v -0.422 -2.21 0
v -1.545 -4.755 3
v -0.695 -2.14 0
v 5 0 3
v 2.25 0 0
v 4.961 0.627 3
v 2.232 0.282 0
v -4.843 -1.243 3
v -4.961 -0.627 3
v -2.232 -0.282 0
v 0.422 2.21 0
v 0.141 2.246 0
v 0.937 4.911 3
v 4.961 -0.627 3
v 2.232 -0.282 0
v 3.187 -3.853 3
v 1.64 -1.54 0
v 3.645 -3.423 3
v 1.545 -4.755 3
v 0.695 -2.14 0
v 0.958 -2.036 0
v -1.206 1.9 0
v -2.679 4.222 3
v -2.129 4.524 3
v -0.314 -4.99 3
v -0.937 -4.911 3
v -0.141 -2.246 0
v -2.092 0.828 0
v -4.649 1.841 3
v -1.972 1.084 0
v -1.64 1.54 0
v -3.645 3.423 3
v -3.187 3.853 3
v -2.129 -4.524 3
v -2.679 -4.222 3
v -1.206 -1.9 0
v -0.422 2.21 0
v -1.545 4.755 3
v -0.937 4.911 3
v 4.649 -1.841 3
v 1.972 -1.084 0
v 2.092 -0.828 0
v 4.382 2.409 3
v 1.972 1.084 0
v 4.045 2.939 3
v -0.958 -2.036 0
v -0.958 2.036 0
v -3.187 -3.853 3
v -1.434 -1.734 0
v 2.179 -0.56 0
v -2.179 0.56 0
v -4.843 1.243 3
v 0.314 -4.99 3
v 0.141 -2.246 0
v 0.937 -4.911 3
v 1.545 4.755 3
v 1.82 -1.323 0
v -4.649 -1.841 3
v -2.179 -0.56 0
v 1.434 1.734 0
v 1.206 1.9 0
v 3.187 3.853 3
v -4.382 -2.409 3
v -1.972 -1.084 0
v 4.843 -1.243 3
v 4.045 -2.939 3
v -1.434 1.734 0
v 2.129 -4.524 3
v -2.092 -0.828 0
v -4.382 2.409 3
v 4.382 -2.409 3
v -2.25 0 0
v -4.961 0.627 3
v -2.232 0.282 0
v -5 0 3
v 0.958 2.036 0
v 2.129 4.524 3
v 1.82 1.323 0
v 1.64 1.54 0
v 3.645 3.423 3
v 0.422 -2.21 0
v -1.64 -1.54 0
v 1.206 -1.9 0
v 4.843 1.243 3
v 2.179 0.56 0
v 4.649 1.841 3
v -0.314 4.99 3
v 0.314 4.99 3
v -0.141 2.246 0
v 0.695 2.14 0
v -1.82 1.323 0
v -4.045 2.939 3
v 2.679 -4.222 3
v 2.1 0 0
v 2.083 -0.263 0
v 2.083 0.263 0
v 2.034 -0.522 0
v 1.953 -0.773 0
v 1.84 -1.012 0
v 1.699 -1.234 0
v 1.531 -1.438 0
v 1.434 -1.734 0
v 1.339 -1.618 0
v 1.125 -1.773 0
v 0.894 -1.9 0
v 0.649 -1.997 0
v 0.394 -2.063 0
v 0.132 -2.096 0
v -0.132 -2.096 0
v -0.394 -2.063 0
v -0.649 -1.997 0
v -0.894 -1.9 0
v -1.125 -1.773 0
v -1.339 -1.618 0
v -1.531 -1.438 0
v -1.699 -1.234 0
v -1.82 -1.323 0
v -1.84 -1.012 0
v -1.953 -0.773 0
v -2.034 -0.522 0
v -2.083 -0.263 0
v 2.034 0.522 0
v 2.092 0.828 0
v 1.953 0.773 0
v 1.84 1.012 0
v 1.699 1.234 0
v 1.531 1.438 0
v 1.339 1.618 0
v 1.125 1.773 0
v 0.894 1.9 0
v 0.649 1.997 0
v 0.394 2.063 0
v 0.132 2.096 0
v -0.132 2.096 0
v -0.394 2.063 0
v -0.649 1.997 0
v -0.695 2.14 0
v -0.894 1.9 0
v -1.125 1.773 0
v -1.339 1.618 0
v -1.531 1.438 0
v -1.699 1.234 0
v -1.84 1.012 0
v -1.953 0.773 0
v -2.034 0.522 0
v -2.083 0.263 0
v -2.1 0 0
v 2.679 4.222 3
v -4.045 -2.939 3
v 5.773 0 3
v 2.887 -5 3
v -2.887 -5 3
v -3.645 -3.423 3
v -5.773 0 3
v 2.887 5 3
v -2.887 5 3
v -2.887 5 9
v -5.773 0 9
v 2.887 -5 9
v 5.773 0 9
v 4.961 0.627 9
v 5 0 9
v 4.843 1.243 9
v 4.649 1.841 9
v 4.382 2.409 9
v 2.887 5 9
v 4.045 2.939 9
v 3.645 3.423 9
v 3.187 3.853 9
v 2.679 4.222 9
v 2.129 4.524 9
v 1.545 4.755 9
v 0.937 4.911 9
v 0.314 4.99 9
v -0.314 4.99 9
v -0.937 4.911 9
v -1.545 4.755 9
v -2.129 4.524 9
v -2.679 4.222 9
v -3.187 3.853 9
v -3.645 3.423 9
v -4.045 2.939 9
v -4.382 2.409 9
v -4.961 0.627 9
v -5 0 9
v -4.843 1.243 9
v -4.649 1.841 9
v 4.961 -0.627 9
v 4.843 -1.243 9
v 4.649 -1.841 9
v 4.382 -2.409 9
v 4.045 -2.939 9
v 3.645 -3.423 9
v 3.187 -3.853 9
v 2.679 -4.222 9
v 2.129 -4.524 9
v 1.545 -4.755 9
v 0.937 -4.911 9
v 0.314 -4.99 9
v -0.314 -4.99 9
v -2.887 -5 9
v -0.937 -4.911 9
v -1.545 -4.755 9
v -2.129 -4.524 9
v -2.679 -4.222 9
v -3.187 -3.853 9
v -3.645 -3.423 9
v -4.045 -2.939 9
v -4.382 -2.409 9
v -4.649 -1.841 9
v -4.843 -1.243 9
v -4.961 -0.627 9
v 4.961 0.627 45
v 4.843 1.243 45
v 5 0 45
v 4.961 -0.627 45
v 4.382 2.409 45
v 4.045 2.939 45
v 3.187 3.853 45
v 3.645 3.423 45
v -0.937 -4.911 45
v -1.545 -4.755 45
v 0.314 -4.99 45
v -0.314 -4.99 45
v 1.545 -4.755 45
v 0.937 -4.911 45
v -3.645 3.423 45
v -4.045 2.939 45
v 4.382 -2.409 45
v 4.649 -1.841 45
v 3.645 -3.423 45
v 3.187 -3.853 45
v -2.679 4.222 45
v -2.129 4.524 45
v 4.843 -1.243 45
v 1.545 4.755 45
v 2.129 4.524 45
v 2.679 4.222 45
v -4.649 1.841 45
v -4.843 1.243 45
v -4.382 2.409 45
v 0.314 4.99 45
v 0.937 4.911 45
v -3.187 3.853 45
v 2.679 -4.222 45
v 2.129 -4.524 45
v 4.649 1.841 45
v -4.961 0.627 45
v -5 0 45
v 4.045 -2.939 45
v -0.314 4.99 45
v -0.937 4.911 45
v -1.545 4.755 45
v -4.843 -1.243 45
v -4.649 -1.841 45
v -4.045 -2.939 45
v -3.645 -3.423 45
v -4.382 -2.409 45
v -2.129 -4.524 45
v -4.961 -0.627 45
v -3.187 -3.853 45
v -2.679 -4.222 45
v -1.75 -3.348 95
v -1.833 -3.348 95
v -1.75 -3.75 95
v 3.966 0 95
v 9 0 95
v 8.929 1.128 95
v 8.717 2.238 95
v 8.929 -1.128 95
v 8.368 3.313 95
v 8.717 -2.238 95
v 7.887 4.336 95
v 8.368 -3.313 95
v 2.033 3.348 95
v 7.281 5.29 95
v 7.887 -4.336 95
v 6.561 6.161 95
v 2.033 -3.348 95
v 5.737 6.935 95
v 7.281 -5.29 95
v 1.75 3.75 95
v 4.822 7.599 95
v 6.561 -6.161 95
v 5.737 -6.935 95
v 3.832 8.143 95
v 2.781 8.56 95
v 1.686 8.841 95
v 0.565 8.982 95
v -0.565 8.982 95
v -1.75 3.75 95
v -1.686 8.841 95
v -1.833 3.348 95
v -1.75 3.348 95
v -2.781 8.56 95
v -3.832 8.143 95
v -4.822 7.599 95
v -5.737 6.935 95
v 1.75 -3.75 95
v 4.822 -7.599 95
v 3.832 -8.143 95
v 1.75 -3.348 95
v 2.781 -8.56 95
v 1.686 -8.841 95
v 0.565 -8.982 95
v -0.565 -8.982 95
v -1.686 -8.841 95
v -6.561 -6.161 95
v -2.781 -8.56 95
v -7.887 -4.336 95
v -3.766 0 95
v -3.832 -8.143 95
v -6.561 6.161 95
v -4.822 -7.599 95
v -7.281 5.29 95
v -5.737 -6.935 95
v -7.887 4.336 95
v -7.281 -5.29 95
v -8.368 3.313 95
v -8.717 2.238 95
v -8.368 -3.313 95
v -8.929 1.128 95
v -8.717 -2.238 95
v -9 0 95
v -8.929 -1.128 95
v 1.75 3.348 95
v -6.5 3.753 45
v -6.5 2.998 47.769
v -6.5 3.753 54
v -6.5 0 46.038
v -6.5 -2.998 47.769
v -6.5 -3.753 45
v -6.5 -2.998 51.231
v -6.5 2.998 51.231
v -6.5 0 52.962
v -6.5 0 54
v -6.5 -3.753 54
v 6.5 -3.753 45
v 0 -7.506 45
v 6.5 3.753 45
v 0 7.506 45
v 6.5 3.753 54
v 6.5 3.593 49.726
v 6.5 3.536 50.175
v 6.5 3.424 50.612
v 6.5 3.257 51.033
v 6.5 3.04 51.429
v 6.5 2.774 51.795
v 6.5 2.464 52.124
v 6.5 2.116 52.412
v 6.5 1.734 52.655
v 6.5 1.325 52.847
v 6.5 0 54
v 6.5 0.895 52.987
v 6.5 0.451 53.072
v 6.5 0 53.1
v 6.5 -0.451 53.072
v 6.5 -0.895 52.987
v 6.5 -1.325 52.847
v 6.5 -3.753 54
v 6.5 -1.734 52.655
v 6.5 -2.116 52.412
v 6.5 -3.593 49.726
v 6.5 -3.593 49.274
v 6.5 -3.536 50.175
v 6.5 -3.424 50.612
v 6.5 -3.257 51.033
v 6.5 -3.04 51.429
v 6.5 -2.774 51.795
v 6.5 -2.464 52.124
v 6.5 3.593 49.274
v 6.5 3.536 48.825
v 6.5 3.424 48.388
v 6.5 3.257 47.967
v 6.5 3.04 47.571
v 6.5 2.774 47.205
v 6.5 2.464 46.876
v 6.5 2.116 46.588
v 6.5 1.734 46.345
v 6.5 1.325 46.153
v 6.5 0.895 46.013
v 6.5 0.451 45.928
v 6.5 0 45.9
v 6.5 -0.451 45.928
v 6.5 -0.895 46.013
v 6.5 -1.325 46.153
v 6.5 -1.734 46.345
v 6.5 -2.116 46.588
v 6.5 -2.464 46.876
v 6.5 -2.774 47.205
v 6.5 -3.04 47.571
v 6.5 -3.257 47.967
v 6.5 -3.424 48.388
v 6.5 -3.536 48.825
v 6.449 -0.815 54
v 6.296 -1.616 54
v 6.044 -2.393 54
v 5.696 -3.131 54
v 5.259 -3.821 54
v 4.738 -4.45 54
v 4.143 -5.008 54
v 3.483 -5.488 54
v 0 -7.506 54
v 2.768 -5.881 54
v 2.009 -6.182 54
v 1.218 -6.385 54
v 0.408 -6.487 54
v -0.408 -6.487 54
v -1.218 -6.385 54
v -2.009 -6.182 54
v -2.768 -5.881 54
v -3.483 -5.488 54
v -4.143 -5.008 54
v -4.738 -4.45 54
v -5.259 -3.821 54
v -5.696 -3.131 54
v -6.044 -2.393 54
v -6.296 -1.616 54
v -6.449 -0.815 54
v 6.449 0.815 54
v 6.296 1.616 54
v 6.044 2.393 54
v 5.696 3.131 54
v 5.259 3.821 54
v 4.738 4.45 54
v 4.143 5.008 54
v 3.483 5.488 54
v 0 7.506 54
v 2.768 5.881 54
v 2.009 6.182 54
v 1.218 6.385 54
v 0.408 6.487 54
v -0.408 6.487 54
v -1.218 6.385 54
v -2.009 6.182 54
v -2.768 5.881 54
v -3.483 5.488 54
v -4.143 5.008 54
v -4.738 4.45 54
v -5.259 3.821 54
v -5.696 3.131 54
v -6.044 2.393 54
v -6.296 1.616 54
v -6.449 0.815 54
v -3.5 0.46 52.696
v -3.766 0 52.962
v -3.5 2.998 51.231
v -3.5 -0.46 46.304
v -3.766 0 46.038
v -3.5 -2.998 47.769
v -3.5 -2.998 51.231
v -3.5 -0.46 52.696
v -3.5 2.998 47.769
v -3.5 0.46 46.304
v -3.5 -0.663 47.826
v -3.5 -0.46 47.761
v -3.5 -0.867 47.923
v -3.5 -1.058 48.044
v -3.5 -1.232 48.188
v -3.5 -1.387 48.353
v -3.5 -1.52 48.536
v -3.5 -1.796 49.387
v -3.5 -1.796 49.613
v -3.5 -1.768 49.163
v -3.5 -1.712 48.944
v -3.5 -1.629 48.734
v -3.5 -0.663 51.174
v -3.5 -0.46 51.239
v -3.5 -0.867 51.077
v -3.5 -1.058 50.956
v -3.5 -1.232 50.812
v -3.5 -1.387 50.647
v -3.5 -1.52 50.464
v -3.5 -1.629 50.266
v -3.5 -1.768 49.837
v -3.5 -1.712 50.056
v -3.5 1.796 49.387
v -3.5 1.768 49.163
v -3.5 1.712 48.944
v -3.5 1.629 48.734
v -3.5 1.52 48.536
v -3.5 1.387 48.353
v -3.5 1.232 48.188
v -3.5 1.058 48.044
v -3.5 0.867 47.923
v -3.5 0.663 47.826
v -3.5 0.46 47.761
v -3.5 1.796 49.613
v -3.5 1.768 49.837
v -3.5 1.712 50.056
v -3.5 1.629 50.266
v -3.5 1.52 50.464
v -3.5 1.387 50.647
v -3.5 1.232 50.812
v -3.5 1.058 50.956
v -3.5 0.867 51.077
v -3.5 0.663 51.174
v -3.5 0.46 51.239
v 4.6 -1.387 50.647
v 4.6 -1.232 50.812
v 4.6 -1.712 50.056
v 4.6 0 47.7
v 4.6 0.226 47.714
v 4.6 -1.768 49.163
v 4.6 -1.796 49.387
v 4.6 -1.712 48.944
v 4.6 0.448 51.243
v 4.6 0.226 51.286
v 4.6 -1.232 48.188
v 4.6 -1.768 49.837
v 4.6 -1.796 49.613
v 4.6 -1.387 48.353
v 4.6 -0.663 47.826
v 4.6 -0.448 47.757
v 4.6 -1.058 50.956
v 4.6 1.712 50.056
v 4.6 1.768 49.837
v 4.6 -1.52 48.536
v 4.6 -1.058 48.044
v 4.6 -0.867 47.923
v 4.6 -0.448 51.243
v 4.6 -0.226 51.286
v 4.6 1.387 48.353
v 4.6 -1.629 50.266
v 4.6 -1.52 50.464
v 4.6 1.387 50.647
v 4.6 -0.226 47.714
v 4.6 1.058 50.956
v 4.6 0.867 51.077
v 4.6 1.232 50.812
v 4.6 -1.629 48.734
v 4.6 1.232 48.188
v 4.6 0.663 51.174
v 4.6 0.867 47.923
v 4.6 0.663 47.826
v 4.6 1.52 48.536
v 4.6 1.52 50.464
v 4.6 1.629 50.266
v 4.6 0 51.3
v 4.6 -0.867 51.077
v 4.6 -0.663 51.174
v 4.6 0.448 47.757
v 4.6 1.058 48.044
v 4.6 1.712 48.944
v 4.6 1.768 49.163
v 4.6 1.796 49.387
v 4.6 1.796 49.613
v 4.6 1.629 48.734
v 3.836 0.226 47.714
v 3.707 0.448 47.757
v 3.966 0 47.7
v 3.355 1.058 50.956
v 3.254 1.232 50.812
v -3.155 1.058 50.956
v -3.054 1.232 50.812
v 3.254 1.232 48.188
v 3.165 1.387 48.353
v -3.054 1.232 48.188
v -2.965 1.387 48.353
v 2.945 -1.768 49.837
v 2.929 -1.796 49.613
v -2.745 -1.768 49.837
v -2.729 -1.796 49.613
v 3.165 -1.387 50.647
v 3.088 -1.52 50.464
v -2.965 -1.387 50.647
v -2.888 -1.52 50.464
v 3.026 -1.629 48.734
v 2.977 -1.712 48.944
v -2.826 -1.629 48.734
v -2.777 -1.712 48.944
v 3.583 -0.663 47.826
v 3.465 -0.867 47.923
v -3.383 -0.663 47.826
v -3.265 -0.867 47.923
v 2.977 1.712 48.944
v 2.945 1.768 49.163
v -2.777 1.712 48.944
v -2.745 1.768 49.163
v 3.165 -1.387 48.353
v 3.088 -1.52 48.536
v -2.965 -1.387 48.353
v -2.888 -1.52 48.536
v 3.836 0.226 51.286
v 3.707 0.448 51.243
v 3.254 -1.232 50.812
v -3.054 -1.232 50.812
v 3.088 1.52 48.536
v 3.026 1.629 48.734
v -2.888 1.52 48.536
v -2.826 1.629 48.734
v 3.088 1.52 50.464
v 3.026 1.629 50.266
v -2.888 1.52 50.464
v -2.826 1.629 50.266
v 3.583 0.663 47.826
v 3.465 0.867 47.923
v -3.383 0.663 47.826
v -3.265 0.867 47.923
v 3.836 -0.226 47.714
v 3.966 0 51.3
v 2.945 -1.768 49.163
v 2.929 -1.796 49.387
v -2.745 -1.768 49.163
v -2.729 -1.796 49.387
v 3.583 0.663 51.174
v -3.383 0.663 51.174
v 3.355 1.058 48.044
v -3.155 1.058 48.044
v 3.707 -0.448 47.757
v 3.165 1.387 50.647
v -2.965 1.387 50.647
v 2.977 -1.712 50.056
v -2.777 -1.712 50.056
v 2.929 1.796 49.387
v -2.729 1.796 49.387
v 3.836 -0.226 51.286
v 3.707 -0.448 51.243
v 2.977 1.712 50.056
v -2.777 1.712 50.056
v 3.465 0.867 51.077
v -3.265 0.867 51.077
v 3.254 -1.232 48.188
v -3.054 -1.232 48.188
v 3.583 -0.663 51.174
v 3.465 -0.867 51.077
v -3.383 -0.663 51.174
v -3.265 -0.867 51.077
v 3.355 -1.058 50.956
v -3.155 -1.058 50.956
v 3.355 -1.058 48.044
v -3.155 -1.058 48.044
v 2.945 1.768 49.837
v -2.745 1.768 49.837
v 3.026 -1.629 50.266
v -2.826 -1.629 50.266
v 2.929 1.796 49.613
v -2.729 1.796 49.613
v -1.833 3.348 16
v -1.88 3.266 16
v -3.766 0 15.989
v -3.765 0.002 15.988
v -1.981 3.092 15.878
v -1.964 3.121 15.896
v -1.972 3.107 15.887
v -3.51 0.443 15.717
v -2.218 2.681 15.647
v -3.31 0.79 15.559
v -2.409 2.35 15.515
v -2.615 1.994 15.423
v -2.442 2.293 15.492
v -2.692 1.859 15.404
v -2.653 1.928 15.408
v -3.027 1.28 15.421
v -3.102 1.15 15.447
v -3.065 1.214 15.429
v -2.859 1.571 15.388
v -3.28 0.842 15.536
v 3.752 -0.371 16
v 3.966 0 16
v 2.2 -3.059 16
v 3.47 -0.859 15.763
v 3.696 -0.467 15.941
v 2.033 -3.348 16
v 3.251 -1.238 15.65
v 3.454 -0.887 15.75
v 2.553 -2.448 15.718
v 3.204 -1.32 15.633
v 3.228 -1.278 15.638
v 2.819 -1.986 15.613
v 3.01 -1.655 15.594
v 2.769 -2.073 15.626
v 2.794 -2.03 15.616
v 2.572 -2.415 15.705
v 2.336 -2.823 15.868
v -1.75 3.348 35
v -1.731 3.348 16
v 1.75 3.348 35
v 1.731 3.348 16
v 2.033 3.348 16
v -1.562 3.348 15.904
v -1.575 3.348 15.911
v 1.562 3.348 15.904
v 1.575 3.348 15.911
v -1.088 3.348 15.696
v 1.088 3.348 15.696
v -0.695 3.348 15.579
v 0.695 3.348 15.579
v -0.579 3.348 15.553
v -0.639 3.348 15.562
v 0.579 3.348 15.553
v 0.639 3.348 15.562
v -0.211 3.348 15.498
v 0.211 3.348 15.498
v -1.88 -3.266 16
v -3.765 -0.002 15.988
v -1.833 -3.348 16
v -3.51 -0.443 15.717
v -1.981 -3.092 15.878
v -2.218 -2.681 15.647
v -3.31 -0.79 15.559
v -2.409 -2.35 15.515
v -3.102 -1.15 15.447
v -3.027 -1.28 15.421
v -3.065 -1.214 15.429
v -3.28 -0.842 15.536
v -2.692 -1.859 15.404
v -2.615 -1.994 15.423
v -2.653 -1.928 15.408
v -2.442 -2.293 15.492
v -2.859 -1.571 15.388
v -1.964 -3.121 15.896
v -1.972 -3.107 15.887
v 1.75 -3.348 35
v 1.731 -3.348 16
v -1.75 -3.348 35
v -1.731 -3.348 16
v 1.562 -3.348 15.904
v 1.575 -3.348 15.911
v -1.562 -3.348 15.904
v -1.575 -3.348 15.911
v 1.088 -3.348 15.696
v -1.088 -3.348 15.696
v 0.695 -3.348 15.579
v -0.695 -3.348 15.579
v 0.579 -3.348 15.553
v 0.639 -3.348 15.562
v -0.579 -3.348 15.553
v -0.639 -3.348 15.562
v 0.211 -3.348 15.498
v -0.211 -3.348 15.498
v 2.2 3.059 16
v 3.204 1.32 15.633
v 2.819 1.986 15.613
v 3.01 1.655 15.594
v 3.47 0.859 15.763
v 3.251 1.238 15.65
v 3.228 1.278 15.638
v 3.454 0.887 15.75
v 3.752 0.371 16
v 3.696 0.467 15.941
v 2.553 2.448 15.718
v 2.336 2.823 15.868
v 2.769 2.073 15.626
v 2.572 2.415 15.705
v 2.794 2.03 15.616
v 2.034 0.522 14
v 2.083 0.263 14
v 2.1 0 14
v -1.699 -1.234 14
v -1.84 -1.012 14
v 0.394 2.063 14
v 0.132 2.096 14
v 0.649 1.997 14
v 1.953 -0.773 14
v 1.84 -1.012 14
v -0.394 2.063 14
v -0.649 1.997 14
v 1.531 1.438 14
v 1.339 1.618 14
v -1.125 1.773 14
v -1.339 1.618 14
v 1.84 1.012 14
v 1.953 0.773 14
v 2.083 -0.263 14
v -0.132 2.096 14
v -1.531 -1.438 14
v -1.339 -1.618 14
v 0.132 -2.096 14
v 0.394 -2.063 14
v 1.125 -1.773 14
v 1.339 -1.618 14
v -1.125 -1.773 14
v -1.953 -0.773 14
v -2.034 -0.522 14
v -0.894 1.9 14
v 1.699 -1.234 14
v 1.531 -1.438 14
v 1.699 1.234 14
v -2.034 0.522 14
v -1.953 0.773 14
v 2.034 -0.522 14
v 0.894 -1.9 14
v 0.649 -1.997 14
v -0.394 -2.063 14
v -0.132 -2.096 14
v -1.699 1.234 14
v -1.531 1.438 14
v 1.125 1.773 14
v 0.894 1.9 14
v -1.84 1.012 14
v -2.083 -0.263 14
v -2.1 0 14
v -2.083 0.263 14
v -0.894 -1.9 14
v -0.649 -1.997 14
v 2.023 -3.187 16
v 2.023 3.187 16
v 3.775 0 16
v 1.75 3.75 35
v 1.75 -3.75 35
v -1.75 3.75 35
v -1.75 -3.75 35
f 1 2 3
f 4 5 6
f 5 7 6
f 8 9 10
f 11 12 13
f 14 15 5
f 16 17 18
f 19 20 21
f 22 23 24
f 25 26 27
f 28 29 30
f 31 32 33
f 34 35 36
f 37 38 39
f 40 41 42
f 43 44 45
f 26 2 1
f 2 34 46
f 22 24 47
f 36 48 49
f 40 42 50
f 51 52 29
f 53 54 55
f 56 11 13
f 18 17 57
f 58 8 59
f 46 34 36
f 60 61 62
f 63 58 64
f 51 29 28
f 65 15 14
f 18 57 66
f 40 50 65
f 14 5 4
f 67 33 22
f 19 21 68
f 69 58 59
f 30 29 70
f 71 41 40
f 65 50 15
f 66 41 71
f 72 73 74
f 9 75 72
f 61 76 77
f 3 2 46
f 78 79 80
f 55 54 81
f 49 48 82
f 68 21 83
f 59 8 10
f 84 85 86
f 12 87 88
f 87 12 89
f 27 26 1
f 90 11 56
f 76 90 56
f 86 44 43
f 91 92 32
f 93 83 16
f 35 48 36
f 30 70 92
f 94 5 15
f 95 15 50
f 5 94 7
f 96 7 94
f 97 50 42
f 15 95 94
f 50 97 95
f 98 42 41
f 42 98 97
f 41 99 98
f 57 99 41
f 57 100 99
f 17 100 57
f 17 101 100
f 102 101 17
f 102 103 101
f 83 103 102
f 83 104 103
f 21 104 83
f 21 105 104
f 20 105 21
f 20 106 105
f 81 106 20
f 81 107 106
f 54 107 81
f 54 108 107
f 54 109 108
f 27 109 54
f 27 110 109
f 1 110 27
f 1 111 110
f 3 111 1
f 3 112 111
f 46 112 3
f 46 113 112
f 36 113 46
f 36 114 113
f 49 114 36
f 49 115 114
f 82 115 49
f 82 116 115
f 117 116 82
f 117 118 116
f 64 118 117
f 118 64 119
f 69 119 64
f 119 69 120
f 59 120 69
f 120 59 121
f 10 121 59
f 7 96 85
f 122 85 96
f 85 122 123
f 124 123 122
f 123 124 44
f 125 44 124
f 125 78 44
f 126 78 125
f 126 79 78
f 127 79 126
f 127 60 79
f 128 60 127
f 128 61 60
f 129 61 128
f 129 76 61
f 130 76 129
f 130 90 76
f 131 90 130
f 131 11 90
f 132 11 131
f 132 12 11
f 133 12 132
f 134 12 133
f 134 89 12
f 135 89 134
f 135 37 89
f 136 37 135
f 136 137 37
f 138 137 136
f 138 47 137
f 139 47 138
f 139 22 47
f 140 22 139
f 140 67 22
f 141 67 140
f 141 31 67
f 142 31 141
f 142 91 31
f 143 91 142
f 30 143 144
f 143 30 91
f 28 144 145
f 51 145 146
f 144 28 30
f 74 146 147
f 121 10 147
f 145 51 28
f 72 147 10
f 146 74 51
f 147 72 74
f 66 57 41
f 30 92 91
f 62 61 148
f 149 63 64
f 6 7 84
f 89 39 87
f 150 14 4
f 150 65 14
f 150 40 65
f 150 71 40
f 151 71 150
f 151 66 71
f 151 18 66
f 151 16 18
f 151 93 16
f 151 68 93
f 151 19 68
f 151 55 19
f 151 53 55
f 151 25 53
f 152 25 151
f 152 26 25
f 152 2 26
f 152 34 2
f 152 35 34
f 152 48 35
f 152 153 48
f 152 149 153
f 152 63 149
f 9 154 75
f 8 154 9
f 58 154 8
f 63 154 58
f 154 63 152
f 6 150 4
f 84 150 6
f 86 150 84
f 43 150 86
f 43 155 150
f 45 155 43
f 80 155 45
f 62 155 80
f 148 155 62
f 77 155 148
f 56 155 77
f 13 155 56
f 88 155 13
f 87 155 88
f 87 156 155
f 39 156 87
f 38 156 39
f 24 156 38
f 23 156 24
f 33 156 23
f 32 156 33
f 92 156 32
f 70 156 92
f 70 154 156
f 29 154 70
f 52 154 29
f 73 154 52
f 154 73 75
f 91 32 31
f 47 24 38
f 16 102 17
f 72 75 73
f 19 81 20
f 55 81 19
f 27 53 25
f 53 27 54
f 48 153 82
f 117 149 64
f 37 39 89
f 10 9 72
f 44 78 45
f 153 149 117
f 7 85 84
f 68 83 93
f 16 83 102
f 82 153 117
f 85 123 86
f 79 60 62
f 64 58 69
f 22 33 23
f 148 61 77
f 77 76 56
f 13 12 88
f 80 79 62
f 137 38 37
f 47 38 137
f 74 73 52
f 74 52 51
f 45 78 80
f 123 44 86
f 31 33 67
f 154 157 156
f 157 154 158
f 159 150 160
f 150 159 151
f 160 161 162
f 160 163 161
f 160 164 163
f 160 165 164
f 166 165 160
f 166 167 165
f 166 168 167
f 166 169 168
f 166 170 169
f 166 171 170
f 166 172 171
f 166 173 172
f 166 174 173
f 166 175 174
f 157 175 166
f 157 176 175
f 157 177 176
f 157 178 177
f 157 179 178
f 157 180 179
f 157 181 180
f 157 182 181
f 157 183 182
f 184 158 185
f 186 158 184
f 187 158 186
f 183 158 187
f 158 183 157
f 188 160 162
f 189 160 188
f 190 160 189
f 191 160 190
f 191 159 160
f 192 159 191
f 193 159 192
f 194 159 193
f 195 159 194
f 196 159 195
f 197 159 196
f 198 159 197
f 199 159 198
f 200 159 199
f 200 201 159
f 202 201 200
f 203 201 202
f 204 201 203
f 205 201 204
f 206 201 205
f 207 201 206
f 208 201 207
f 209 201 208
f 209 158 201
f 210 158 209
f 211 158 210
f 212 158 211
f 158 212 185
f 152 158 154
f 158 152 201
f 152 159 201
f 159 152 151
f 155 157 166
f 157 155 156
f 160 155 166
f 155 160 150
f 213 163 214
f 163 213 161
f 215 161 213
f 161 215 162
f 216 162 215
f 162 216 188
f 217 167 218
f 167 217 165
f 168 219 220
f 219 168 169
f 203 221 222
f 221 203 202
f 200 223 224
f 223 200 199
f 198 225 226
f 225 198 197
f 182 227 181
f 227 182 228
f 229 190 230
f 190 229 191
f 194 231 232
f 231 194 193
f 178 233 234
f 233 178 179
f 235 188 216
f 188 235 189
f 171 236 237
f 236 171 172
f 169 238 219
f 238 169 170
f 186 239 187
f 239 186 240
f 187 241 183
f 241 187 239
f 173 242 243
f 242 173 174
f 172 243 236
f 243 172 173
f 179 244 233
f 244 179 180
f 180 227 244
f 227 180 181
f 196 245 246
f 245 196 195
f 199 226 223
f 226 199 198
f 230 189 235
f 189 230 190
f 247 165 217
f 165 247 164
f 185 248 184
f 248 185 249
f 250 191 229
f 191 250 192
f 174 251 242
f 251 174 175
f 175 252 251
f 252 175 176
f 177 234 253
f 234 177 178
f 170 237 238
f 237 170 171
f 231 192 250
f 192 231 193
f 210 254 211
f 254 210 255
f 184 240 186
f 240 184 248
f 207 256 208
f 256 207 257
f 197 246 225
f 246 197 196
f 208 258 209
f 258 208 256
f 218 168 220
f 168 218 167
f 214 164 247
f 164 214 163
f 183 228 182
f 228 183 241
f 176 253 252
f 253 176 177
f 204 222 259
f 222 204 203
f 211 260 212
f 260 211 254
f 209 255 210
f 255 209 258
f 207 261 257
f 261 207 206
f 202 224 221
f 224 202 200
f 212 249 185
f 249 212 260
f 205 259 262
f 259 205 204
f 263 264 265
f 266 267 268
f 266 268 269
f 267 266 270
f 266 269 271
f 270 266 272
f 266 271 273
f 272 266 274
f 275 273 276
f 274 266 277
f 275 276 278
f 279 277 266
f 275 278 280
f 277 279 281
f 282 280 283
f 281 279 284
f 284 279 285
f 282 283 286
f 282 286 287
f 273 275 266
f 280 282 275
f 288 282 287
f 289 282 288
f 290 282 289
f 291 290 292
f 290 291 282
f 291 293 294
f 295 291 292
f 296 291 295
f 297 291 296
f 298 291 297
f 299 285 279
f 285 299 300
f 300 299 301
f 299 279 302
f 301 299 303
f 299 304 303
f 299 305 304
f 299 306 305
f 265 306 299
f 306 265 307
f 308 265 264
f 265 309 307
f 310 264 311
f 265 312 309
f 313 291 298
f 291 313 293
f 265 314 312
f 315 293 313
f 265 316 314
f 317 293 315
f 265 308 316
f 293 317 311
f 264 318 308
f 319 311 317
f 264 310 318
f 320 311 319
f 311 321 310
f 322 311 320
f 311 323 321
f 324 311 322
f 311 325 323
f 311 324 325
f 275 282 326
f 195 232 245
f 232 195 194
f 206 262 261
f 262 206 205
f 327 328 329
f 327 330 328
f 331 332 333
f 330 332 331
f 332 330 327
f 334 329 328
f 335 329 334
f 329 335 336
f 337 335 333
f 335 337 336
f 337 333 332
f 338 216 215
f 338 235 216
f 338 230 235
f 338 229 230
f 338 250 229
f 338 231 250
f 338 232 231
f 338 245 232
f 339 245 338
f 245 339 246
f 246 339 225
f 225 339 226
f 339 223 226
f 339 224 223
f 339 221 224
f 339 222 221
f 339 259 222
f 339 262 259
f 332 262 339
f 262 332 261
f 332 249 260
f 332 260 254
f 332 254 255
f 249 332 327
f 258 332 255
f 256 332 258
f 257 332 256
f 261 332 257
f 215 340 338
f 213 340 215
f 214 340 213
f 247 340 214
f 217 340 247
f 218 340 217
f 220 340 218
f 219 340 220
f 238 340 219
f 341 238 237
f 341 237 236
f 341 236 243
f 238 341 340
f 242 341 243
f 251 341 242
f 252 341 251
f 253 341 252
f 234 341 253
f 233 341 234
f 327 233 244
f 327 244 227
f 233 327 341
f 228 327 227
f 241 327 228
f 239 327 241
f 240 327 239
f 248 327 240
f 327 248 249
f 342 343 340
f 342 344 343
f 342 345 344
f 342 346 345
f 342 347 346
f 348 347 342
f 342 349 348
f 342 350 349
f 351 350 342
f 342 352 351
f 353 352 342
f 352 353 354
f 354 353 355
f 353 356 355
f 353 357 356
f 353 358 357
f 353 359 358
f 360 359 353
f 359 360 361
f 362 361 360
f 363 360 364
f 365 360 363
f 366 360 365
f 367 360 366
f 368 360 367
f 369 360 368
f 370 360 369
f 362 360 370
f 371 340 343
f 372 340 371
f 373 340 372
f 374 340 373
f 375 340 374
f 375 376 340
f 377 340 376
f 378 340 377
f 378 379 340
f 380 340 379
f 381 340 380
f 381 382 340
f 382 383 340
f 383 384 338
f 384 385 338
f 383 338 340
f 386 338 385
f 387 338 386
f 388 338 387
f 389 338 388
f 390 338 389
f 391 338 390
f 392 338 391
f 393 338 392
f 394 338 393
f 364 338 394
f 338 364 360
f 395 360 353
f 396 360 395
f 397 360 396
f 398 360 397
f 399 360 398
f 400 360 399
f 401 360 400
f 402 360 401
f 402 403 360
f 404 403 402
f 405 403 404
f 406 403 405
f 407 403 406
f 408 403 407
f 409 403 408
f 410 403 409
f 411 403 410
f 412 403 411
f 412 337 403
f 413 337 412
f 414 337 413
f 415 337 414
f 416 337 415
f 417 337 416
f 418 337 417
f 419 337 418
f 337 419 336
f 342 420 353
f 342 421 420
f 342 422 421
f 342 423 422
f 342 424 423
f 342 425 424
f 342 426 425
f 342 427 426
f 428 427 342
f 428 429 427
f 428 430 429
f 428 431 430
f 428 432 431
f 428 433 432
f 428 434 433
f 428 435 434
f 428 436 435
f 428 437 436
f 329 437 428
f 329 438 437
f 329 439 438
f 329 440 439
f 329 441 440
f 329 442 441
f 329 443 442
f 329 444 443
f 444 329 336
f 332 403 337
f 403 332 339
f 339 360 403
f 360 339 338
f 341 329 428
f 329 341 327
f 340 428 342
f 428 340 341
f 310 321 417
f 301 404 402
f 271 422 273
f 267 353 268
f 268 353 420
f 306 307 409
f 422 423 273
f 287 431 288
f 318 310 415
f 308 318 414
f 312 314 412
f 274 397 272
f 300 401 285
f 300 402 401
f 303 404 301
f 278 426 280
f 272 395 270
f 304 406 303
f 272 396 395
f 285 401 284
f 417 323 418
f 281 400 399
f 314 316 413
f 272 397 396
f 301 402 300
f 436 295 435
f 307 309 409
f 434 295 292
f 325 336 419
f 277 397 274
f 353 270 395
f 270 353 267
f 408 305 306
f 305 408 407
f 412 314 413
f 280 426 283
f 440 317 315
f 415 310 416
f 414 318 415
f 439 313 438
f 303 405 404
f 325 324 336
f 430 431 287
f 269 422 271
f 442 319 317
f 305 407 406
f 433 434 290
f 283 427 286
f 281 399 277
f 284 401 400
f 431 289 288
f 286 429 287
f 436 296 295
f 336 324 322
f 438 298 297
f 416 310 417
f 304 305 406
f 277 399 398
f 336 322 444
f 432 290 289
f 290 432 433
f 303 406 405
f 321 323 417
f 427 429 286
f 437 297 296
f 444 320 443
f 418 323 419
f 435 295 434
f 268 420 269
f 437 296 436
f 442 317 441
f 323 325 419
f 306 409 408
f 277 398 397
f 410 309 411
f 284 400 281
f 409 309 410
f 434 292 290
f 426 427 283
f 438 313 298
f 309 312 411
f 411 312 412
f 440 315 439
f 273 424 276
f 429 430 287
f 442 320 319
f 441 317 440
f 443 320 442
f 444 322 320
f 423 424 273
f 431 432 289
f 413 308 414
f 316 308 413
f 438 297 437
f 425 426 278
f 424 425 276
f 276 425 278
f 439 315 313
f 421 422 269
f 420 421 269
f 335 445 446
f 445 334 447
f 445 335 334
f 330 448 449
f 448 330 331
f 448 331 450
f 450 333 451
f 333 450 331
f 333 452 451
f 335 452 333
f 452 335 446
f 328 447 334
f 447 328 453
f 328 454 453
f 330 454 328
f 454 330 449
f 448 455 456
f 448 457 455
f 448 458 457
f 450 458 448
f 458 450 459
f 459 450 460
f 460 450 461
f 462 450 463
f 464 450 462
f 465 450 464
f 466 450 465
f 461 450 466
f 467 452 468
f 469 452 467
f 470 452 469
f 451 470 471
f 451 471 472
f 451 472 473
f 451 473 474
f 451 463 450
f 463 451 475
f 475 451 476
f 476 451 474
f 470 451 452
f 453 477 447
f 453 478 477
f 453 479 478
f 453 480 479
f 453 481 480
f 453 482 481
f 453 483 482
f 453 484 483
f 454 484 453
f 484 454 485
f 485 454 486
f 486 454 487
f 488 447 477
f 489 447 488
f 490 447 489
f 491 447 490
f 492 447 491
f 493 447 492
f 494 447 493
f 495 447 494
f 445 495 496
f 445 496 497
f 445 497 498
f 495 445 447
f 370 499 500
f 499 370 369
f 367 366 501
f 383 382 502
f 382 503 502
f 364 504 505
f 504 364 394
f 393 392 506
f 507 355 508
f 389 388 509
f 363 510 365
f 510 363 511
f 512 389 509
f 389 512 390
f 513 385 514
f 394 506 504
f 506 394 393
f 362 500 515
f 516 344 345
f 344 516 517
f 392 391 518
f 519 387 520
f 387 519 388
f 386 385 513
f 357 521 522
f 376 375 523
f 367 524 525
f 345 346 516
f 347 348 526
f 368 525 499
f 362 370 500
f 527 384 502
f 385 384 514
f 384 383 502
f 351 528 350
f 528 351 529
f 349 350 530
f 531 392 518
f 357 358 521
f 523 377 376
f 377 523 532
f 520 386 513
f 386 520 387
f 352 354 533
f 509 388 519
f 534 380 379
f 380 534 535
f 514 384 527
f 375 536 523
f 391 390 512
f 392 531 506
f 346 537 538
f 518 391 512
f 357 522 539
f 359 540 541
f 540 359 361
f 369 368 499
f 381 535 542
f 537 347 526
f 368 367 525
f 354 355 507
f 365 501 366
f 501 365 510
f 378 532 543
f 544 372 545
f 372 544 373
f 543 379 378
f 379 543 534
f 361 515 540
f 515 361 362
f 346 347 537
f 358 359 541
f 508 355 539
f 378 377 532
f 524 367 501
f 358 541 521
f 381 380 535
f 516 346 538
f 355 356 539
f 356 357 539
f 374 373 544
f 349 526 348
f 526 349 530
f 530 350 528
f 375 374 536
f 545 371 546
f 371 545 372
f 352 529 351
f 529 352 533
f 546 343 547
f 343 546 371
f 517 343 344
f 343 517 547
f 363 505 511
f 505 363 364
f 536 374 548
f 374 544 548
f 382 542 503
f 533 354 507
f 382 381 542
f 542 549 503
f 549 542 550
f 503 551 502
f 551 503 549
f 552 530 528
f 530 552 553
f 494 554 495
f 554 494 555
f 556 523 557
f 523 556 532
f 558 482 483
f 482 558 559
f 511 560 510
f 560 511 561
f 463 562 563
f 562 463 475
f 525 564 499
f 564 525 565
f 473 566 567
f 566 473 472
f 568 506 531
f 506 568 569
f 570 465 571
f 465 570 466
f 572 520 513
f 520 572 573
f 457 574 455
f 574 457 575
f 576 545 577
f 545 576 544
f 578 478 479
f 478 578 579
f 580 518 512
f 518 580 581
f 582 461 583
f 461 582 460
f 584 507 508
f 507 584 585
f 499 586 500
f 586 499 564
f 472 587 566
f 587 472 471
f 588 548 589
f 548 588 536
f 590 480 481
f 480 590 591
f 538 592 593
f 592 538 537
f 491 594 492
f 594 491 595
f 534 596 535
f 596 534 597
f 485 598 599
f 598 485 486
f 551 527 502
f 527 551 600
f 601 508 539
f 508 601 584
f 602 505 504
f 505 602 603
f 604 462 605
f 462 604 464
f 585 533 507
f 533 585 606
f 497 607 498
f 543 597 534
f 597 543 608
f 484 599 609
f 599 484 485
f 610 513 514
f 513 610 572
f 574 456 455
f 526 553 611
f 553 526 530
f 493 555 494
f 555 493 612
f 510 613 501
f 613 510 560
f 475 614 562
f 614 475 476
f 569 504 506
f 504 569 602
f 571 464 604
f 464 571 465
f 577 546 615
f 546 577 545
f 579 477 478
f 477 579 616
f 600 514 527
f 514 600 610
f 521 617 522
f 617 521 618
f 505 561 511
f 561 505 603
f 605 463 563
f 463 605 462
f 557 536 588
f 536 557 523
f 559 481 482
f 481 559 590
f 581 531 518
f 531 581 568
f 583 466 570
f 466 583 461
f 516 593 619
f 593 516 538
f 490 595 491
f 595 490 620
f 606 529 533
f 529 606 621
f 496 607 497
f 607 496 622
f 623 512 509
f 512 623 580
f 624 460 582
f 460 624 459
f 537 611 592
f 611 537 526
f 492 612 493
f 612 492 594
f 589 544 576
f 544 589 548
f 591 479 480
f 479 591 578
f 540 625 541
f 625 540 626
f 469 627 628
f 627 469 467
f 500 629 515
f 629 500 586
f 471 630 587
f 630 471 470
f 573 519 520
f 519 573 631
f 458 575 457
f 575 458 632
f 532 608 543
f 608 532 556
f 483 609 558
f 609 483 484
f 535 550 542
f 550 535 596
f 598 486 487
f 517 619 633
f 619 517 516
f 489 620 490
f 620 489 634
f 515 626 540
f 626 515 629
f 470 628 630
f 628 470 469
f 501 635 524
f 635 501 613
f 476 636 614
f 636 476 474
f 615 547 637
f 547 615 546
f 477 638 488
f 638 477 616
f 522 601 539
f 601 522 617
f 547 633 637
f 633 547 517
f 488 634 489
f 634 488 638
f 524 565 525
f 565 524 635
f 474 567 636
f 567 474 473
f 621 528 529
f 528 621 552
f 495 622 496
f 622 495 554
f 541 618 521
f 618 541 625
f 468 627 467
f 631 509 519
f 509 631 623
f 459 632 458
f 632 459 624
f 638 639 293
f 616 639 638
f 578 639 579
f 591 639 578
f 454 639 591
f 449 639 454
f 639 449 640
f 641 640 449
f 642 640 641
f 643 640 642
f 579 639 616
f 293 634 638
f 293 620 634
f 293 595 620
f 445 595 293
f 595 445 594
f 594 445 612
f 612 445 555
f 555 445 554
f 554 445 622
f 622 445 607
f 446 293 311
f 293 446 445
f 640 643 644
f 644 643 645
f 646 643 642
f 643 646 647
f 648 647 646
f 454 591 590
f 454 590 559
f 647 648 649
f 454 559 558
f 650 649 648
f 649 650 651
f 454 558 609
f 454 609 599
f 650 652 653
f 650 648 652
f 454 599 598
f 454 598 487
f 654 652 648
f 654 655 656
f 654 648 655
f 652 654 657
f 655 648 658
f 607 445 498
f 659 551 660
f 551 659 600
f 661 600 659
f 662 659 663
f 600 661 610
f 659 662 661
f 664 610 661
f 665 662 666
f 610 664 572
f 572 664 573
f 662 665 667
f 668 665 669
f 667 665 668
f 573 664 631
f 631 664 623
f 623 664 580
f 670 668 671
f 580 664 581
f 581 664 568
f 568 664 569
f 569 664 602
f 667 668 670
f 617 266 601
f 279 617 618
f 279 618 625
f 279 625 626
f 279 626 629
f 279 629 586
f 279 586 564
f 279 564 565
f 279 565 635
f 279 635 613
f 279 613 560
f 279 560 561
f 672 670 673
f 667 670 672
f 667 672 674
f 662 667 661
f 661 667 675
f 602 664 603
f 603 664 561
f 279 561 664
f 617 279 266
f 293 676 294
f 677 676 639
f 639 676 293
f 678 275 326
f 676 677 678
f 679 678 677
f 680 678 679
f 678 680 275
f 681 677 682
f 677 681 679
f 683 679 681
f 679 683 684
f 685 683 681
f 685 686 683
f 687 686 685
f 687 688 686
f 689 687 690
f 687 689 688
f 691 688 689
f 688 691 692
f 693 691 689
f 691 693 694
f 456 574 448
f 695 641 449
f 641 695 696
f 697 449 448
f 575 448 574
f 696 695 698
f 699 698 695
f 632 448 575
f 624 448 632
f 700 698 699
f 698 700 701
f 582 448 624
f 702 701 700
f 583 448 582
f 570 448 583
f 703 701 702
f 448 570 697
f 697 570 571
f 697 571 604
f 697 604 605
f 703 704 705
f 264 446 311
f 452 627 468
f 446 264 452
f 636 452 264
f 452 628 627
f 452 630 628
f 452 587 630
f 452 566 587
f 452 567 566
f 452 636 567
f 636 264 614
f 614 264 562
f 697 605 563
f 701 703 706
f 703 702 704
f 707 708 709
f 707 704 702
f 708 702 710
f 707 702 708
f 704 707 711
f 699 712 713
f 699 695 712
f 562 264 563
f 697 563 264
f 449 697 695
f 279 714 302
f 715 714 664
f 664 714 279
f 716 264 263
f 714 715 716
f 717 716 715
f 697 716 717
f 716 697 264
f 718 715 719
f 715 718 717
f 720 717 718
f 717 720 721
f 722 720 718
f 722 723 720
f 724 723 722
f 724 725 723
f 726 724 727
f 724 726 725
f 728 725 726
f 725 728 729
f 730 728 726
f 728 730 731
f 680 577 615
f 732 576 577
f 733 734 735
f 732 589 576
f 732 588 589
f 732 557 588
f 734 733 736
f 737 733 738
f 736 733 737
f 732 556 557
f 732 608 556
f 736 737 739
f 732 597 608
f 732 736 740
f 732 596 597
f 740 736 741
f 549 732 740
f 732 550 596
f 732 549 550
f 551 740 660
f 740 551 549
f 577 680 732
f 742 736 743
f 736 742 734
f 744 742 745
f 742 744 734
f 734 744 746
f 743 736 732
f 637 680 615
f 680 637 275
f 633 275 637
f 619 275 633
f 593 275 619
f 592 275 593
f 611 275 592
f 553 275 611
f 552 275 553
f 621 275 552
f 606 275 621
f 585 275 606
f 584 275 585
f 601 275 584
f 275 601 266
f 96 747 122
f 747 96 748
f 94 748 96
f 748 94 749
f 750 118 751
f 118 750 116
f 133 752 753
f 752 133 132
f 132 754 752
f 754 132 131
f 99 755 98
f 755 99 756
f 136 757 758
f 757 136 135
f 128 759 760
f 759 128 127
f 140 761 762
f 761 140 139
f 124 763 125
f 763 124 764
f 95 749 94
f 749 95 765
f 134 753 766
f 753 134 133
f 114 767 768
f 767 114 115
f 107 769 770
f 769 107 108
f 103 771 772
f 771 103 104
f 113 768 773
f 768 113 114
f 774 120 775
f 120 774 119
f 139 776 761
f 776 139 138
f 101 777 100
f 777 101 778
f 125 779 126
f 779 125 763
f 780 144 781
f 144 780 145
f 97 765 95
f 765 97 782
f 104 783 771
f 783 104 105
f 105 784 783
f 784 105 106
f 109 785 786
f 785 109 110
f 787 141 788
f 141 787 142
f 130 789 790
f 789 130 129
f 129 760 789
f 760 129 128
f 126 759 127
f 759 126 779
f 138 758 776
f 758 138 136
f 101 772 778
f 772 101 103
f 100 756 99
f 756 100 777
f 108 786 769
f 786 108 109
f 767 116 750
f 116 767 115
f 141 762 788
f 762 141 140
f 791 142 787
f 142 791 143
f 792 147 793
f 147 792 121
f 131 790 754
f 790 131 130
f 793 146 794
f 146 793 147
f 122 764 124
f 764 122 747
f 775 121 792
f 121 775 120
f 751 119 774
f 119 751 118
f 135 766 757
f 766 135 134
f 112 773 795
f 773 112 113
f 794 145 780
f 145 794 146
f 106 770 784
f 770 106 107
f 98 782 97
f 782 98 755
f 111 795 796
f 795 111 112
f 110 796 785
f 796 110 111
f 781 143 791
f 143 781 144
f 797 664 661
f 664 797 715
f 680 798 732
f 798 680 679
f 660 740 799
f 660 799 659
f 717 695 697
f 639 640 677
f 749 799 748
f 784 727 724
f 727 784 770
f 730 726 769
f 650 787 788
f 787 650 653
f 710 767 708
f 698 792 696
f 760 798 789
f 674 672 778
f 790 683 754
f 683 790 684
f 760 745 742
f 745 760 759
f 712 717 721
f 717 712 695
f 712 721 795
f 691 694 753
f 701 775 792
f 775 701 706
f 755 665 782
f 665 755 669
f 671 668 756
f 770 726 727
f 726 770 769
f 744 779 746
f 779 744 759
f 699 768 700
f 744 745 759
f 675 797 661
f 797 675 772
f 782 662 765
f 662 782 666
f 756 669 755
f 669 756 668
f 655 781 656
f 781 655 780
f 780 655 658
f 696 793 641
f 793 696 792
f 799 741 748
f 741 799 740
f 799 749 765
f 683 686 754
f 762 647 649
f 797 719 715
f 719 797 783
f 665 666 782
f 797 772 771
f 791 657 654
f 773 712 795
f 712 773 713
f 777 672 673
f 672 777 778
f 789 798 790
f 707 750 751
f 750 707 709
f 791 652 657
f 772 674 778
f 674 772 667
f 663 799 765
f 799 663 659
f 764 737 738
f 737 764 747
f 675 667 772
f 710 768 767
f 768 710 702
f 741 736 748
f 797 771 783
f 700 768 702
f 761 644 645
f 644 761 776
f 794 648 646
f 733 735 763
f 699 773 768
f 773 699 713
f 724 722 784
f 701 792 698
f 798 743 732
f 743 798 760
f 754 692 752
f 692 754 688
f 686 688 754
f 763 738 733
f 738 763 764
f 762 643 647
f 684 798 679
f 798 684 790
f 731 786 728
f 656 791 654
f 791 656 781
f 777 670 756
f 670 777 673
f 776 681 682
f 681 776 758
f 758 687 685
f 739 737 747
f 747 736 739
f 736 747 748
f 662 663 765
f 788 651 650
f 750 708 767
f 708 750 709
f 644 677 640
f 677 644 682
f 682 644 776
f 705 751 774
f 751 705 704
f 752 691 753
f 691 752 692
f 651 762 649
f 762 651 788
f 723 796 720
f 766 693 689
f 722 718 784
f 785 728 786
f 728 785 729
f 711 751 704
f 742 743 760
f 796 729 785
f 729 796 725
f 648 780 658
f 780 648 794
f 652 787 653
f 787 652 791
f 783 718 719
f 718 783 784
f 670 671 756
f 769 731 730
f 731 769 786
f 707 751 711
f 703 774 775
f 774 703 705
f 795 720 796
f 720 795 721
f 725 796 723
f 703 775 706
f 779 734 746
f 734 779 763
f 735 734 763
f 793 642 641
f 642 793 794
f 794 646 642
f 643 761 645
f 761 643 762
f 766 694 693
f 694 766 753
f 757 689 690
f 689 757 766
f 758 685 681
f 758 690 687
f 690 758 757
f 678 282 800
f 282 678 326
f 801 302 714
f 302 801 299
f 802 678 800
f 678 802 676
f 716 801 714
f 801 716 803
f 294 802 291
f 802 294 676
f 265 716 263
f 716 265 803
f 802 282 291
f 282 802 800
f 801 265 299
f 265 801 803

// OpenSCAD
$fn = 50;


difference() {
	union() {
		cylinder(h = 3, r1 = 2.2500000000, r2 = 5.0000000000);
		translate(v = [0, 0, 3]) {
			linear_extrude(height = 6) {
				polygon(points = [[5.7735000000, 0.0000000000], [2.8867500000, 4.9999976687], [-2.8867500000, 4.9999976687], [-5.7735000000, 0.0000000000], [-2.8867500000, -4.9999976687], [2.8867500000, -4.9999976687]]);
			}
		}
		translate(v = [0, 0, 3.0000000000]) {
			cylinder(h = 92, r = 5.0000000000);
		}
		translate(v = [0, 0, 45]) {
			rotate(a = [0, 0, 30.0000000000]) {
				linear_extrude(height = 9) {
					polygon(points = [[7.5055500000, 0.0000000000], [3.7527750000, 6.4999969694], [-3.7527750000, 6.4999969694], [-7.5055500000, 0.0000000000], [-3.7527750000, -6.4999969694], [3.7527750000, -6.4999969694]]);
				}
			}
		}
		translate(v = [0, 0, 54.0000000000]) {
			cylinder(h = 41, r1 = 6.5000000000, r2 = 9.0000000000);
		}
	}
	union() {
		translate(v = [6.5000000000, 0, 49.5000000000]) {
			rotate(a = [0, 90, 0]) {
				difference() {
					union() {
						translate(v = [0, 0, -10.5000000000]) {
							rotate(a = [0, 0, 0]) {
								difference() {
									union() {
										translate(v = [0, 0, -250]) {
											linear_extrude(height = 250) {
												polygon(points = [[3.4620000000, 0.0000000000], [1.7310000000, 2.9981799479], [-1.7310000000, 2.9981799479], [-3.4620000000, 0.0000000000], [-1.7310000000, -2.9981799479], [1.7310000000, -2.9981799479]]);
											}
										}
									}
									union();
								}
							}
						}
						translate(v = [0, 0, -10.0000000000]) {
							rotate(a = [0, 0, 0]) {
								difference() {
									union() {
										translate(v = [0, 0, -250]) {
											linear_extrude(height = 250) {
												polygon(points = [[3.4620000000, 0.0000000000], [1.7310000000, 2.9981799479], [-1.7310000000, 2.9981799479], [-3.4620000000, 0.0000000000], [-1.7310000000, -2.9981799479], [1.7310000000, -2.9981799479]]);
											}
										}
									}
									union();
								}
							}
						}
						translate(v = [0, 0, -10.5000000000]) {
							rotate(a = [0, 0, 0]) {
								difference() {
									union() {
										translate(v = [0, 0, -250]) {
											linear_extrude(height = 250) {
												polygon(points = [[3.4620000000, 0.0000000000], [1.7310000000, 2.9981799479], [-1.7310000000, 2.9981799479], [-3.4620000000, 0.0000000000], [-1.7310000000, -2.9981799479], [1.7310000000, -2.9981799479]]);
											}
										}
									}
									union();
								}
							}
						}
						translate(v = [0, 0, -13.0000000000]) {
							cylinder(h = 13, r = 1.5000000000);
						}
						translate(v = [0, 0, -1.9000000000]) {
							cylinder(h = 1.9000000000, r1 = 1.8000000000, r2 = 3.6000000000);
						}
						cylinder(h = 250, r = 3.6000000000);
						translate(v = [0, 0, -13.0000000000]) {
							cylinder(h = 13, r = 1.8000000000);
						}
						translate(v = [0, 0, -13.0000000000]) {
							cylinder(h = 13, r = 1.5000000000);
						}
					}
					union();
				}
			}
		}
		translate(v = [0, 0, 14]) {
			rotate(a = [0, 0, 0]) {
				difference() {
					union() {
						translate(v = [0.1000000000, 0, 0]) {
							linear_extrude(height = 228.2000000000) {
								polygon(points = [[3.8658550000, 0.0000000000], [1.9329275000, 3.3479286373], [-1.9329275000, 3.3479286373], [-3.8658550000, 0.0000000000], [-1.9329275000, -3.3479286373], [1.9329275000, -3.3479286373]]);
							}
						}
						translate(v = [0, 0, -71.8000000000]) {
							cylinder(h = 100, r = 2.1000000000);
						}
					}
					union() {
						difference() {
							cylinder(h = 2, r1 = 10.1000000000, r2 = 11.7750000000);
							cylinder(h = 2, r1 = 2.1000000000, r2 = 3.7750000000);
						}
					}
				}
			}
		}
		#translate(v = [-1.7500000000, -3.7500000000, 35]) {
			cube(size = [3.5000000000, 7.5000000000, 60]);
		}
	}
}
